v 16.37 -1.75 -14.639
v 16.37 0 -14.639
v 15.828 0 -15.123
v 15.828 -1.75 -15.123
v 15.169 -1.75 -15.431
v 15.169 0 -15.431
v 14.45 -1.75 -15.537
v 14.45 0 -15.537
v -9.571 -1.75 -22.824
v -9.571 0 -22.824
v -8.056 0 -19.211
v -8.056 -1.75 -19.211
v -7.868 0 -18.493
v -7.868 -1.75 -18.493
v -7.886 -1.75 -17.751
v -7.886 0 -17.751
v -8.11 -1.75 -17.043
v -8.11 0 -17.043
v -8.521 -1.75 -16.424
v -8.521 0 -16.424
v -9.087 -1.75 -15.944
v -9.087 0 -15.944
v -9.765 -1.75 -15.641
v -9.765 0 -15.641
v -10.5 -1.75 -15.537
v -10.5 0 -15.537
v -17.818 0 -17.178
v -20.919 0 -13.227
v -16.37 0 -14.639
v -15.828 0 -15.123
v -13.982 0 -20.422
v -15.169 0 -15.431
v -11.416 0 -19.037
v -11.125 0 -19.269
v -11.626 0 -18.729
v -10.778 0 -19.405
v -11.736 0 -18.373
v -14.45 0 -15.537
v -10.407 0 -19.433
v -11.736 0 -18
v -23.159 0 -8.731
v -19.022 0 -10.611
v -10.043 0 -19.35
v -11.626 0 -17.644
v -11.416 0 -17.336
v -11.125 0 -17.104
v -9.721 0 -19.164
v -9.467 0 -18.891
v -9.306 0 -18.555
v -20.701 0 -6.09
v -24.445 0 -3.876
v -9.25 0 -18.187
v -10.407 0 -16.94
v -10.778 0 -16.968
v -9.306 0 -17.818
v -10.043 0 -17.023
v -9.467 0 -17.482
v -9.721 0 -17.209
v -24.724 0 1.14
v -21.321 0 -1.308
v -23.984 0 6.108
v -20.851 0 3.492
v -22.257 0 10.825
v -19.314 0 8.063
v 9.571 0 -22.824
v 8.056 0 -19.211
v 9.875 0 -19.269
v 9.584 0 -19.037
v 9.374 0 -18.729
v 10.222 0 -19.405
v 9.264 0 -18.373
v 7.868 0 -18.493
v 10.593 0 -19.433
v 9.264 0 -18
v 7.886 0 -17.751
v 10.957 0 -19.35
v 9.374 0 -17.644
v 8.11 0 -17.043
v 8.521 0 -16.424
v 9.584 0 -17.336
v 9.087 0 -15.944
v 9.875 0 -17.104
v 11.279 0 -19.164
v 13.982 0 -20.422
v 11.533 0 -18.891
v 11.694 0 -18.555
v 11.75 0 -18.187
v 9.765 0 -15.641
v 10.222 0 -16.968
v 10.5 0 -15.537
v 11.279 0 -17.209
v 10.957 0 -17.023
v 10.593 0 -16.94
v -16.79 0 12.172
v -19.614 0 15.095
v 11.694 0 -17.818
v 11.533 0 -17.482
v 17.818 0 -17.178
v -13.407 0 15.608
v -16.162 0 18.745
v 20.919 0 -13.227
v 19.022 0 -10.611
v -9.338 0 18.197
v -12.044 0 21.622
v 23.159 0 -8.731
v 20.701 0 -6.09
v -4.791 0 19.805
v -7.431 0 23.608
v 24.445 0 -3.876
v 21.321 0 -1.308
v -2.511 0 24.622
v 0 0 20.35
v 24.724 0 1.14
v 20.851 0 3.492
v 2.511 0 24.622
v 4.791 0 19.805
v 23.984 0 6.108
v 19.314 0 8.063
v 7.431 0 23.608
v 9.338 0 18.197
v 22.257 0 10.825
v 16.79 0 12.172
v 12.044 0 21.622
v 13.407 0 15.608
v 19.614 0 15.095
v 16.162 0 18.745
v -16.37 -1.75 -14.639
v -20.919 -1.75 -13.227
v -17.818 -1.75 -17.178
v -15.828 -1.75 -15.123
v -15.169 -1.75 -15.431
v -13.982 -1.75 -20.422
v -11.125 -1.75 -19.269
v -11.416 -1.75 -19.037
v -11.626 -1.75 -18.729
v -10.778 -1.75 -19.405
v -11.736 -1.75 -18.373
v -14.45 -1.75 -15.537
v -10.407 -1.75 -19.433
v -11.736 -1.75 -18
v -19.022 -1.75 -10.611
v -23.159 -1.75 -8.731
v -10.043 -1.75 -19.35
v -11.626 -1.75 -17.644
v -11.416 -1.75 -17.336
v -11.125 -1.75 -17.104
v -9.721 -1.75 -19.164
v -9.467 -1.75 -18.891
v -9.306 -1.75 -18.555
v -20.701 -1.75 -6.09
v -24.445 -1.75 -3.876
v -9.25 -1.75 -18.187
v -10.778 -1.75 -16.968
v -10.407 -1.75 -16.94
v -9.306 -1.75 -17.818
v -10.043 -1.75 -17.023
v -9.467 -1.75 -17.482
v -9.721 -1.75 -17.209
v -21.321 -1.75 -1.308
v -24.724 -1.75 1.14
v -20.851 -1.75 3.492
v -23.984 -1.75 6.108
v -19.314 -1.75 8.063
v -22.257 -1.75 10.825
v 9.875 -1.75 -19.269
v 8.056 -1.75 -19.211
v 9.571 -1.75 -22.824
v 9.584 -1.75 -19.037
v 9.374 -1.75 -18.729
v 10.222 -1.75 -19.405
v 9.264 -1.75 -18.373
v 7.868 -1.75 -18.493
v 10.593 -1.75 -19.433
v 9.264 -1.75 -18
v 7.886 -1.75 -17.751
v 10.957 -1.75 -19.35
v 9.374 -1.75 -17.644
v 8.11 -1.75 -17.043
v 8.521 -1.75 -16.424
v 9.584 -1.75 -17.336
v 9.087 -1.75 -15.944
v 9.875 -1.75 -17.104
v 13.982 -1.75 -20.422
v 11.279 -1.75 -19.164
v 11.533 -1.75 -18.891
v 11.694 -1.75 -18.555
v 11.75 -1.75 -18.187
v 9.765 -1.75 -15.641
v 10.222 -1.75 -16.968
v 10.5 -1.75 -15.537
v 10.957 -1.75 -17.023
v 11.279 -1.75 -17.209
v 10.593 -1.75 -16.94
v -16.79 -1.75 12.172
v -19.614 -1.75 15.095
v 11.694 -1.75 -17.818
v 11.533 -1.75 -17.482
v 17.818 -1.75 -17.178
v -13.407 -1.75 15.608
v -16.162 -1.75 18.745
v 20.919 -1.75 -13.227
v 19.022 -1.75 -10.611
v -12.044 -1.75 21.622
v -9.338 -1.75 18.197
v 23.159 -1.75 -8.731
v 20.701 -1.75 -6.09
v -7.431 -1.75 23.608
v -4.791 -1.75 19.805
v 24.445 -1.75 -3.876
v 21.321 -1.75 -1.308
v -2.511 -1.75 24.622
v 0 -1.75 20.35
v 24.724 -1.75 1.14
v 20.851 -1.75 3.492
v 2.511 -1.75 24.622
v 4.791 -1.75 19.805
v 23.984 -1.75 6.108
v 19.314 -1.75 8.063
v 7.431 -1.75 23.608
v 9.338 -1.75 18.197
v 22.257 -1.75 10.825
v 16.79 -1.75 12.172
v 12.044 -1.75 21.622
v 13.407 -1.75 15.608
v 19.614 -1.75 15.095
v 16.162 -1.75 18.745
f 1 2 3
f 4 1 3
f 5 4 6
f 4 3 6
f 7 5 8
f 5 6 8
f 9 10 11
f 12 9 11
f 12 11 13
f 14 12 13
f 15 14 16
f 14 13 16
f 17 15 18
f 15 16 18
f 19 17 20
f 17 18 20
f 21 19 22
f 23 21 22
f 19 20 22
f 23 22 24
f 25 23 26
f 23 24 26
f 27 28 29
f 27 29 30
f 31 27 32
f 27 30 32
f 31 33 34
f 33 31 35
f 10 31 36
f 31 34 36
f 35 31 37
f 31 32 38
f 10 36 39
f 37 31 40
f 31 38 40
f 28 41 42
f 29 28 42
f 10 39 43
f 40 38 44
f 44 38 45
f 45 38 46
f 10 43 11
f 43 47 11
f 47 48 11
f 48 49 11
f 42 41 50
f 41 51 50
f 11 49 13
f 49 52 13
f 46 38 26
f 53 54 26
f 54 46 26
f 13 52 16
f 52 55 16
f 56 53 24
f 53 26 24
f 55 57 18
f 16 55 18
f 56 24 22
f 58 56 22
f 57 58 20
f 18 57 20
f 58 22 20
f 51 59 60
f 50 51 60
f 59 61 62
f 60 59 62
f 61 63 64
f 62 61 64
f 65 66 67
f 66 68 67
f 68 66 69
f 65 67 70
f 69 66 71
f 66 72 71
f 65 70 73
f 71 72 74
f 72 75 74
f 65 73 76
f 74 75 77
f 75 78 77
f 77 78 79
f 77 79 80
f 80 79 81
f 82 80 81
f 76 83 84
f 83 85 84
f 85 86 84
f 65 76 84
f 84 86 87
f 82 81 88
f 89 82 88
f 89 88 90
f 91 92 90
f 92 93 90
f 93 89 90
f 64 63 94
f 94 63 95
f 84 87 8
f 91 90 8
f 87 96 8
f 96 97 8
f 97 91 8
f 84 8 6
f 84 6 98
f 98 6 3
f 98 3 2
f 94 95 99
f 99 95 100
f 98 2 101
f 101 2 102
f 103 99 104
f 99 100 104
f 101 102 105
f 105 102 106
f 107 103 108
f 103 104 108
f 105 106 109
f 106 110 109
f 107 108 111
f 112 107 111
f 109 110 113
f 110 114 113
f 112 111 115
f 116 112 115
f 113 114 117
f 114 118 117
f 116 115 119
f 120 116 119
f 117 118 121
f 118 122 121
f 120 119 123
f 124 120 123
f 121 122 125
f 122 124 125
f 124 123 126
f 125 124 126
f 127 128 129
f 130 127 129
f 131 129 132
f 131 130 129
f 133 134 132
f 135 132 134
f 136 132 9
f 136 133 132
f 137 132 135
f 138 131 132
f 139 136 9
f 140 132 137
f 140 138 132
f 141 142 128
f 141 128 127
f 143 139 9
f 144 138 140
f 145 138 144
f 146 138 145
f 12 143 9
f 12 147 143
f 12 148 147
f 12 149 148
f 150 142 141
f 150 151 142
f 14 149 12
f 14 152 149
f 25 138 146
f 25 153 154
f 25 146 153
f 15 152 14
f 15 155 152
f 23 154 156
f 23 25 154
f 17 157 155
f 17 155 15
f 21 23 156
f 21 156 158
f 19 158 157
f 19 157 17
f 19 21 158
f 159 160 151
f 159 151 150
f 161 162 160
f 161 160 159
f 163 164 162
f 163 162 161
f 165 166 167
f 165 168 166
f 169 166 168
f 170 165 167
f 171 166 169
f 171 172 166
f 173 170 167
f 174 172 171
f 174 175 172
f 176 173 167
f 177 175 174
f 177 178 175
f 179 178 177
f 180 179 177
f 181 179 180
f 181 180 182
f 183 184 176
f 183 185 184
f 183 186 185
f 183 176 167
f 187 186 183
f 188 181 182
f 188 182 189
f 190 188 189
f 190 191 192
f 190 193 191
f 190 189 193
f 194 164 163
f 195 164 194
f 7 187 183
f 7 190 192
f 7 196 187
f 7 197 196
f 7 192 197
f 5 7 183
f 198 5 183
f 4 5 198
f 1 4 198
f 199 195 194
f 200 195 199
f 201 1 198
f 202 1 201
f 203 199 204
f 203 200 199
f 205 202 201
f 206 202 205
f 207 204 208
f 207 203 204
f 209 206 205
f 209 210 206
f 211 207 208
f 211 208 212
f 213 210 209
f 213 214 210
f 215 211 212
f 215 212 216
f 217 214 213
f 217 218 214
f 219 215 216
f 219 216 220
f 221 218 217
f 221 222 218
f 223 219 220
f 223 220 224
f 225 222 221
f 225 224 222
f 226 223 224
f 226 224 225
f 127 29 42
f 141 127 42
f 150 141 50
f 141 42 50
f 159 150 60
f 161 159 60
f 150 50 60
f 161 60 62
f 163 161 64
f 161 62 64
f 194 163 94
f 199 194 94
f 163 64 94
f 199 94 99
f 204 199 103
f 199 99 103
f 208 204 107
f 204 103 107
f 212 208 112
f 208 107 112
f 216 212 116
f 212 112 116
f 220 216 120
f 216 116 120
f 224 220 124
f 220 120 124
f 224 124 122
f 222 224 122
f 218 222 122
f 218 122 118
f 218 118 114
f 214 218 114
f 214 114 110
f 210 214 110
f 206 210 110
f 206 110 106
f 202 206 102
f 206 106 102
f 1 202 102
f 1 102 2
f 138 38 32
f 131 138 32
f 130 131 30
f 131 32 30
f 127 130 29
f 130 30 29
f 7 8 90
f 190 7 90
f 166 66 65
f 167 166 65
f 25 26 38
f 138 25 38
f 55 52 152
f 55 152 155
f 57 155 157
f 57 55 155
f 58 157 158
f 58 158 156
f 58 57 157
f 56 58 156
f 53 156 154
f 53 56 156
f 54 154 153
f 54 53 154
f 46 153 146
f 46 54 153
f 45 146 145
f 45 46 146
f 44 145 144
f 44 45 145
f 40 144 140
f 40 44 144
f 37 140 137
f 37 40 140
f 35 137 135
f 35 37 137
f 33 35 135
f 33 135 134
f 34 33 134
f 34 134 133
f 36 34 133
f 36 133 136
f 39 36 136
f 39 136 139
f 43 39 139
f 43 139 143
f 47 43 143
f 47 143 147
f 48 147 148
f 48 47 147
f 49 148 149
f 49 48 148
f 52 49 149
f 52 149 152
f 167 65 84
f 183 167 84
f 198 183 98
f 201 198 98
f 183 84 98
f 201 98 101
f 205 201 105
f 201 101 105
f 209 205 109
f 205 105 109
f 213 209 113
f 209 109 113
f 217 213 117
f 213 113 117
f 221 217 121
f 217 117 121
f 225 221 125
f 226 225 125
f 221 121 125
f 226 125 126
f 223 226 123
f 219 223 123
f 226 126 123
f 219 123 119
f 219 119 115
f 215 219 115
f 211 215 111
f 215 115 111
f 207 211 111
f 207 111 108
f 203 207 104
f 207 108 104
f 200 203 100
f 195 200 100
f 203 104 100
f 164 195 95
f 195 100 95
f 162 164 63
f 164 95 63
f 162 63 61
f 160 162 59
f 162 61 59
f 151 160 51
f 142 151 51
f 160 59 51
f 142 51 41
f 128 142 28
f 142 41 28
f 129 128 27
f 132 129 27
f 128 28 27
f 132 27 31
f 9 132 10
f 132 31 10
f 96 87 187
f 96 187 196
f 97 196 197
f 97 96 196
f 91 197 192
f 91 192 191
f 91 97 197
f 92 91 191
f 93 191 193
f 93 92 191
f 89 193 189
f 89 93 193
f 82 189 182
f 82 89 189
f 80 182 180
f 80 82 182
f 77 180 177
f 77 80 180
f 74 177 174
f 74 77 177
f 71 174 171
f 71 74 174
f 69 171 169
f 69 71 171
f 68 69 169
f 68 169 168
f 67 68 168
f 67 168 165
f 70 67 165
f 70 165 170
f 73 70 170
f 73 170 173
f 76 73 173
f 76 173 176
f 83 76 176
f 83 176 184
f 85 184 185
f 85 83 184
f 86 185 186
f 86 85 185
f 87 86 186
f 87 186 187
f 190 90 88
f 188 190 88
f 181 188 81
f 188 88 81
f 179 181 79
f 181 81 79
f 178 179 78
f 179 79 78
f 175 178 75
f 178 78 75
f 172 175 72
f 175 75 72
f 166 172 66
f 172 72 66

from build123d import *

# Parameters (mm, degrees)
F0_R     = 1.25
F1_DEPTH = 1.75


with BuildPart() as f1:
    # F0 (on Front) → F1 (new body)
    with BuildSketch(Plane.XZ):
        with BuildLine():
            Line((8.056176, -19.211338), (9.571292, -22.824392))
            ThreePointArc((9.571292, -22.824392), (0, 24.75), (-9.571292, -22.824392))
            Line((-9.571292, -22.824392), (-8.056176, -19.211338))
            ThreePointArc((-8.056176, -19.211338), (-8.293393, -16.719092), (-10.5, -15.536533))
            Line((-10.5, -15.536533), (-14.45036, -15.536533))
            ThreePointArc((-14.45036, -15.536533), (-15.509779, -15.300961), (-16.369542, -14.638638))
            ThreePointArc((-16.369542, -14.638638), (0, 20.35), (16.369542, -14.638638))
            ThreePointArc((16.369542, -14.638638), (15.509779, -15.300961), (14.45036, -15.536533))
            Line((14.45036, -15.536533), (10.5, -15.536533))
            ThreePointArc((10.5, -15.536533), (8.293393, -16.719092), (8.056176, -19.211338))
        make_face()
        with Locations((-10.5, -18.186533)):
            Circle(F0_R, mode=Mode.SUBTRACT)
        with Locations((10.5, -18.186533)):
            Circle(F0_R, mode=Mode.SUBTRACT)
    extrude(amount=F1_DEPTH)


solid = f1.part
